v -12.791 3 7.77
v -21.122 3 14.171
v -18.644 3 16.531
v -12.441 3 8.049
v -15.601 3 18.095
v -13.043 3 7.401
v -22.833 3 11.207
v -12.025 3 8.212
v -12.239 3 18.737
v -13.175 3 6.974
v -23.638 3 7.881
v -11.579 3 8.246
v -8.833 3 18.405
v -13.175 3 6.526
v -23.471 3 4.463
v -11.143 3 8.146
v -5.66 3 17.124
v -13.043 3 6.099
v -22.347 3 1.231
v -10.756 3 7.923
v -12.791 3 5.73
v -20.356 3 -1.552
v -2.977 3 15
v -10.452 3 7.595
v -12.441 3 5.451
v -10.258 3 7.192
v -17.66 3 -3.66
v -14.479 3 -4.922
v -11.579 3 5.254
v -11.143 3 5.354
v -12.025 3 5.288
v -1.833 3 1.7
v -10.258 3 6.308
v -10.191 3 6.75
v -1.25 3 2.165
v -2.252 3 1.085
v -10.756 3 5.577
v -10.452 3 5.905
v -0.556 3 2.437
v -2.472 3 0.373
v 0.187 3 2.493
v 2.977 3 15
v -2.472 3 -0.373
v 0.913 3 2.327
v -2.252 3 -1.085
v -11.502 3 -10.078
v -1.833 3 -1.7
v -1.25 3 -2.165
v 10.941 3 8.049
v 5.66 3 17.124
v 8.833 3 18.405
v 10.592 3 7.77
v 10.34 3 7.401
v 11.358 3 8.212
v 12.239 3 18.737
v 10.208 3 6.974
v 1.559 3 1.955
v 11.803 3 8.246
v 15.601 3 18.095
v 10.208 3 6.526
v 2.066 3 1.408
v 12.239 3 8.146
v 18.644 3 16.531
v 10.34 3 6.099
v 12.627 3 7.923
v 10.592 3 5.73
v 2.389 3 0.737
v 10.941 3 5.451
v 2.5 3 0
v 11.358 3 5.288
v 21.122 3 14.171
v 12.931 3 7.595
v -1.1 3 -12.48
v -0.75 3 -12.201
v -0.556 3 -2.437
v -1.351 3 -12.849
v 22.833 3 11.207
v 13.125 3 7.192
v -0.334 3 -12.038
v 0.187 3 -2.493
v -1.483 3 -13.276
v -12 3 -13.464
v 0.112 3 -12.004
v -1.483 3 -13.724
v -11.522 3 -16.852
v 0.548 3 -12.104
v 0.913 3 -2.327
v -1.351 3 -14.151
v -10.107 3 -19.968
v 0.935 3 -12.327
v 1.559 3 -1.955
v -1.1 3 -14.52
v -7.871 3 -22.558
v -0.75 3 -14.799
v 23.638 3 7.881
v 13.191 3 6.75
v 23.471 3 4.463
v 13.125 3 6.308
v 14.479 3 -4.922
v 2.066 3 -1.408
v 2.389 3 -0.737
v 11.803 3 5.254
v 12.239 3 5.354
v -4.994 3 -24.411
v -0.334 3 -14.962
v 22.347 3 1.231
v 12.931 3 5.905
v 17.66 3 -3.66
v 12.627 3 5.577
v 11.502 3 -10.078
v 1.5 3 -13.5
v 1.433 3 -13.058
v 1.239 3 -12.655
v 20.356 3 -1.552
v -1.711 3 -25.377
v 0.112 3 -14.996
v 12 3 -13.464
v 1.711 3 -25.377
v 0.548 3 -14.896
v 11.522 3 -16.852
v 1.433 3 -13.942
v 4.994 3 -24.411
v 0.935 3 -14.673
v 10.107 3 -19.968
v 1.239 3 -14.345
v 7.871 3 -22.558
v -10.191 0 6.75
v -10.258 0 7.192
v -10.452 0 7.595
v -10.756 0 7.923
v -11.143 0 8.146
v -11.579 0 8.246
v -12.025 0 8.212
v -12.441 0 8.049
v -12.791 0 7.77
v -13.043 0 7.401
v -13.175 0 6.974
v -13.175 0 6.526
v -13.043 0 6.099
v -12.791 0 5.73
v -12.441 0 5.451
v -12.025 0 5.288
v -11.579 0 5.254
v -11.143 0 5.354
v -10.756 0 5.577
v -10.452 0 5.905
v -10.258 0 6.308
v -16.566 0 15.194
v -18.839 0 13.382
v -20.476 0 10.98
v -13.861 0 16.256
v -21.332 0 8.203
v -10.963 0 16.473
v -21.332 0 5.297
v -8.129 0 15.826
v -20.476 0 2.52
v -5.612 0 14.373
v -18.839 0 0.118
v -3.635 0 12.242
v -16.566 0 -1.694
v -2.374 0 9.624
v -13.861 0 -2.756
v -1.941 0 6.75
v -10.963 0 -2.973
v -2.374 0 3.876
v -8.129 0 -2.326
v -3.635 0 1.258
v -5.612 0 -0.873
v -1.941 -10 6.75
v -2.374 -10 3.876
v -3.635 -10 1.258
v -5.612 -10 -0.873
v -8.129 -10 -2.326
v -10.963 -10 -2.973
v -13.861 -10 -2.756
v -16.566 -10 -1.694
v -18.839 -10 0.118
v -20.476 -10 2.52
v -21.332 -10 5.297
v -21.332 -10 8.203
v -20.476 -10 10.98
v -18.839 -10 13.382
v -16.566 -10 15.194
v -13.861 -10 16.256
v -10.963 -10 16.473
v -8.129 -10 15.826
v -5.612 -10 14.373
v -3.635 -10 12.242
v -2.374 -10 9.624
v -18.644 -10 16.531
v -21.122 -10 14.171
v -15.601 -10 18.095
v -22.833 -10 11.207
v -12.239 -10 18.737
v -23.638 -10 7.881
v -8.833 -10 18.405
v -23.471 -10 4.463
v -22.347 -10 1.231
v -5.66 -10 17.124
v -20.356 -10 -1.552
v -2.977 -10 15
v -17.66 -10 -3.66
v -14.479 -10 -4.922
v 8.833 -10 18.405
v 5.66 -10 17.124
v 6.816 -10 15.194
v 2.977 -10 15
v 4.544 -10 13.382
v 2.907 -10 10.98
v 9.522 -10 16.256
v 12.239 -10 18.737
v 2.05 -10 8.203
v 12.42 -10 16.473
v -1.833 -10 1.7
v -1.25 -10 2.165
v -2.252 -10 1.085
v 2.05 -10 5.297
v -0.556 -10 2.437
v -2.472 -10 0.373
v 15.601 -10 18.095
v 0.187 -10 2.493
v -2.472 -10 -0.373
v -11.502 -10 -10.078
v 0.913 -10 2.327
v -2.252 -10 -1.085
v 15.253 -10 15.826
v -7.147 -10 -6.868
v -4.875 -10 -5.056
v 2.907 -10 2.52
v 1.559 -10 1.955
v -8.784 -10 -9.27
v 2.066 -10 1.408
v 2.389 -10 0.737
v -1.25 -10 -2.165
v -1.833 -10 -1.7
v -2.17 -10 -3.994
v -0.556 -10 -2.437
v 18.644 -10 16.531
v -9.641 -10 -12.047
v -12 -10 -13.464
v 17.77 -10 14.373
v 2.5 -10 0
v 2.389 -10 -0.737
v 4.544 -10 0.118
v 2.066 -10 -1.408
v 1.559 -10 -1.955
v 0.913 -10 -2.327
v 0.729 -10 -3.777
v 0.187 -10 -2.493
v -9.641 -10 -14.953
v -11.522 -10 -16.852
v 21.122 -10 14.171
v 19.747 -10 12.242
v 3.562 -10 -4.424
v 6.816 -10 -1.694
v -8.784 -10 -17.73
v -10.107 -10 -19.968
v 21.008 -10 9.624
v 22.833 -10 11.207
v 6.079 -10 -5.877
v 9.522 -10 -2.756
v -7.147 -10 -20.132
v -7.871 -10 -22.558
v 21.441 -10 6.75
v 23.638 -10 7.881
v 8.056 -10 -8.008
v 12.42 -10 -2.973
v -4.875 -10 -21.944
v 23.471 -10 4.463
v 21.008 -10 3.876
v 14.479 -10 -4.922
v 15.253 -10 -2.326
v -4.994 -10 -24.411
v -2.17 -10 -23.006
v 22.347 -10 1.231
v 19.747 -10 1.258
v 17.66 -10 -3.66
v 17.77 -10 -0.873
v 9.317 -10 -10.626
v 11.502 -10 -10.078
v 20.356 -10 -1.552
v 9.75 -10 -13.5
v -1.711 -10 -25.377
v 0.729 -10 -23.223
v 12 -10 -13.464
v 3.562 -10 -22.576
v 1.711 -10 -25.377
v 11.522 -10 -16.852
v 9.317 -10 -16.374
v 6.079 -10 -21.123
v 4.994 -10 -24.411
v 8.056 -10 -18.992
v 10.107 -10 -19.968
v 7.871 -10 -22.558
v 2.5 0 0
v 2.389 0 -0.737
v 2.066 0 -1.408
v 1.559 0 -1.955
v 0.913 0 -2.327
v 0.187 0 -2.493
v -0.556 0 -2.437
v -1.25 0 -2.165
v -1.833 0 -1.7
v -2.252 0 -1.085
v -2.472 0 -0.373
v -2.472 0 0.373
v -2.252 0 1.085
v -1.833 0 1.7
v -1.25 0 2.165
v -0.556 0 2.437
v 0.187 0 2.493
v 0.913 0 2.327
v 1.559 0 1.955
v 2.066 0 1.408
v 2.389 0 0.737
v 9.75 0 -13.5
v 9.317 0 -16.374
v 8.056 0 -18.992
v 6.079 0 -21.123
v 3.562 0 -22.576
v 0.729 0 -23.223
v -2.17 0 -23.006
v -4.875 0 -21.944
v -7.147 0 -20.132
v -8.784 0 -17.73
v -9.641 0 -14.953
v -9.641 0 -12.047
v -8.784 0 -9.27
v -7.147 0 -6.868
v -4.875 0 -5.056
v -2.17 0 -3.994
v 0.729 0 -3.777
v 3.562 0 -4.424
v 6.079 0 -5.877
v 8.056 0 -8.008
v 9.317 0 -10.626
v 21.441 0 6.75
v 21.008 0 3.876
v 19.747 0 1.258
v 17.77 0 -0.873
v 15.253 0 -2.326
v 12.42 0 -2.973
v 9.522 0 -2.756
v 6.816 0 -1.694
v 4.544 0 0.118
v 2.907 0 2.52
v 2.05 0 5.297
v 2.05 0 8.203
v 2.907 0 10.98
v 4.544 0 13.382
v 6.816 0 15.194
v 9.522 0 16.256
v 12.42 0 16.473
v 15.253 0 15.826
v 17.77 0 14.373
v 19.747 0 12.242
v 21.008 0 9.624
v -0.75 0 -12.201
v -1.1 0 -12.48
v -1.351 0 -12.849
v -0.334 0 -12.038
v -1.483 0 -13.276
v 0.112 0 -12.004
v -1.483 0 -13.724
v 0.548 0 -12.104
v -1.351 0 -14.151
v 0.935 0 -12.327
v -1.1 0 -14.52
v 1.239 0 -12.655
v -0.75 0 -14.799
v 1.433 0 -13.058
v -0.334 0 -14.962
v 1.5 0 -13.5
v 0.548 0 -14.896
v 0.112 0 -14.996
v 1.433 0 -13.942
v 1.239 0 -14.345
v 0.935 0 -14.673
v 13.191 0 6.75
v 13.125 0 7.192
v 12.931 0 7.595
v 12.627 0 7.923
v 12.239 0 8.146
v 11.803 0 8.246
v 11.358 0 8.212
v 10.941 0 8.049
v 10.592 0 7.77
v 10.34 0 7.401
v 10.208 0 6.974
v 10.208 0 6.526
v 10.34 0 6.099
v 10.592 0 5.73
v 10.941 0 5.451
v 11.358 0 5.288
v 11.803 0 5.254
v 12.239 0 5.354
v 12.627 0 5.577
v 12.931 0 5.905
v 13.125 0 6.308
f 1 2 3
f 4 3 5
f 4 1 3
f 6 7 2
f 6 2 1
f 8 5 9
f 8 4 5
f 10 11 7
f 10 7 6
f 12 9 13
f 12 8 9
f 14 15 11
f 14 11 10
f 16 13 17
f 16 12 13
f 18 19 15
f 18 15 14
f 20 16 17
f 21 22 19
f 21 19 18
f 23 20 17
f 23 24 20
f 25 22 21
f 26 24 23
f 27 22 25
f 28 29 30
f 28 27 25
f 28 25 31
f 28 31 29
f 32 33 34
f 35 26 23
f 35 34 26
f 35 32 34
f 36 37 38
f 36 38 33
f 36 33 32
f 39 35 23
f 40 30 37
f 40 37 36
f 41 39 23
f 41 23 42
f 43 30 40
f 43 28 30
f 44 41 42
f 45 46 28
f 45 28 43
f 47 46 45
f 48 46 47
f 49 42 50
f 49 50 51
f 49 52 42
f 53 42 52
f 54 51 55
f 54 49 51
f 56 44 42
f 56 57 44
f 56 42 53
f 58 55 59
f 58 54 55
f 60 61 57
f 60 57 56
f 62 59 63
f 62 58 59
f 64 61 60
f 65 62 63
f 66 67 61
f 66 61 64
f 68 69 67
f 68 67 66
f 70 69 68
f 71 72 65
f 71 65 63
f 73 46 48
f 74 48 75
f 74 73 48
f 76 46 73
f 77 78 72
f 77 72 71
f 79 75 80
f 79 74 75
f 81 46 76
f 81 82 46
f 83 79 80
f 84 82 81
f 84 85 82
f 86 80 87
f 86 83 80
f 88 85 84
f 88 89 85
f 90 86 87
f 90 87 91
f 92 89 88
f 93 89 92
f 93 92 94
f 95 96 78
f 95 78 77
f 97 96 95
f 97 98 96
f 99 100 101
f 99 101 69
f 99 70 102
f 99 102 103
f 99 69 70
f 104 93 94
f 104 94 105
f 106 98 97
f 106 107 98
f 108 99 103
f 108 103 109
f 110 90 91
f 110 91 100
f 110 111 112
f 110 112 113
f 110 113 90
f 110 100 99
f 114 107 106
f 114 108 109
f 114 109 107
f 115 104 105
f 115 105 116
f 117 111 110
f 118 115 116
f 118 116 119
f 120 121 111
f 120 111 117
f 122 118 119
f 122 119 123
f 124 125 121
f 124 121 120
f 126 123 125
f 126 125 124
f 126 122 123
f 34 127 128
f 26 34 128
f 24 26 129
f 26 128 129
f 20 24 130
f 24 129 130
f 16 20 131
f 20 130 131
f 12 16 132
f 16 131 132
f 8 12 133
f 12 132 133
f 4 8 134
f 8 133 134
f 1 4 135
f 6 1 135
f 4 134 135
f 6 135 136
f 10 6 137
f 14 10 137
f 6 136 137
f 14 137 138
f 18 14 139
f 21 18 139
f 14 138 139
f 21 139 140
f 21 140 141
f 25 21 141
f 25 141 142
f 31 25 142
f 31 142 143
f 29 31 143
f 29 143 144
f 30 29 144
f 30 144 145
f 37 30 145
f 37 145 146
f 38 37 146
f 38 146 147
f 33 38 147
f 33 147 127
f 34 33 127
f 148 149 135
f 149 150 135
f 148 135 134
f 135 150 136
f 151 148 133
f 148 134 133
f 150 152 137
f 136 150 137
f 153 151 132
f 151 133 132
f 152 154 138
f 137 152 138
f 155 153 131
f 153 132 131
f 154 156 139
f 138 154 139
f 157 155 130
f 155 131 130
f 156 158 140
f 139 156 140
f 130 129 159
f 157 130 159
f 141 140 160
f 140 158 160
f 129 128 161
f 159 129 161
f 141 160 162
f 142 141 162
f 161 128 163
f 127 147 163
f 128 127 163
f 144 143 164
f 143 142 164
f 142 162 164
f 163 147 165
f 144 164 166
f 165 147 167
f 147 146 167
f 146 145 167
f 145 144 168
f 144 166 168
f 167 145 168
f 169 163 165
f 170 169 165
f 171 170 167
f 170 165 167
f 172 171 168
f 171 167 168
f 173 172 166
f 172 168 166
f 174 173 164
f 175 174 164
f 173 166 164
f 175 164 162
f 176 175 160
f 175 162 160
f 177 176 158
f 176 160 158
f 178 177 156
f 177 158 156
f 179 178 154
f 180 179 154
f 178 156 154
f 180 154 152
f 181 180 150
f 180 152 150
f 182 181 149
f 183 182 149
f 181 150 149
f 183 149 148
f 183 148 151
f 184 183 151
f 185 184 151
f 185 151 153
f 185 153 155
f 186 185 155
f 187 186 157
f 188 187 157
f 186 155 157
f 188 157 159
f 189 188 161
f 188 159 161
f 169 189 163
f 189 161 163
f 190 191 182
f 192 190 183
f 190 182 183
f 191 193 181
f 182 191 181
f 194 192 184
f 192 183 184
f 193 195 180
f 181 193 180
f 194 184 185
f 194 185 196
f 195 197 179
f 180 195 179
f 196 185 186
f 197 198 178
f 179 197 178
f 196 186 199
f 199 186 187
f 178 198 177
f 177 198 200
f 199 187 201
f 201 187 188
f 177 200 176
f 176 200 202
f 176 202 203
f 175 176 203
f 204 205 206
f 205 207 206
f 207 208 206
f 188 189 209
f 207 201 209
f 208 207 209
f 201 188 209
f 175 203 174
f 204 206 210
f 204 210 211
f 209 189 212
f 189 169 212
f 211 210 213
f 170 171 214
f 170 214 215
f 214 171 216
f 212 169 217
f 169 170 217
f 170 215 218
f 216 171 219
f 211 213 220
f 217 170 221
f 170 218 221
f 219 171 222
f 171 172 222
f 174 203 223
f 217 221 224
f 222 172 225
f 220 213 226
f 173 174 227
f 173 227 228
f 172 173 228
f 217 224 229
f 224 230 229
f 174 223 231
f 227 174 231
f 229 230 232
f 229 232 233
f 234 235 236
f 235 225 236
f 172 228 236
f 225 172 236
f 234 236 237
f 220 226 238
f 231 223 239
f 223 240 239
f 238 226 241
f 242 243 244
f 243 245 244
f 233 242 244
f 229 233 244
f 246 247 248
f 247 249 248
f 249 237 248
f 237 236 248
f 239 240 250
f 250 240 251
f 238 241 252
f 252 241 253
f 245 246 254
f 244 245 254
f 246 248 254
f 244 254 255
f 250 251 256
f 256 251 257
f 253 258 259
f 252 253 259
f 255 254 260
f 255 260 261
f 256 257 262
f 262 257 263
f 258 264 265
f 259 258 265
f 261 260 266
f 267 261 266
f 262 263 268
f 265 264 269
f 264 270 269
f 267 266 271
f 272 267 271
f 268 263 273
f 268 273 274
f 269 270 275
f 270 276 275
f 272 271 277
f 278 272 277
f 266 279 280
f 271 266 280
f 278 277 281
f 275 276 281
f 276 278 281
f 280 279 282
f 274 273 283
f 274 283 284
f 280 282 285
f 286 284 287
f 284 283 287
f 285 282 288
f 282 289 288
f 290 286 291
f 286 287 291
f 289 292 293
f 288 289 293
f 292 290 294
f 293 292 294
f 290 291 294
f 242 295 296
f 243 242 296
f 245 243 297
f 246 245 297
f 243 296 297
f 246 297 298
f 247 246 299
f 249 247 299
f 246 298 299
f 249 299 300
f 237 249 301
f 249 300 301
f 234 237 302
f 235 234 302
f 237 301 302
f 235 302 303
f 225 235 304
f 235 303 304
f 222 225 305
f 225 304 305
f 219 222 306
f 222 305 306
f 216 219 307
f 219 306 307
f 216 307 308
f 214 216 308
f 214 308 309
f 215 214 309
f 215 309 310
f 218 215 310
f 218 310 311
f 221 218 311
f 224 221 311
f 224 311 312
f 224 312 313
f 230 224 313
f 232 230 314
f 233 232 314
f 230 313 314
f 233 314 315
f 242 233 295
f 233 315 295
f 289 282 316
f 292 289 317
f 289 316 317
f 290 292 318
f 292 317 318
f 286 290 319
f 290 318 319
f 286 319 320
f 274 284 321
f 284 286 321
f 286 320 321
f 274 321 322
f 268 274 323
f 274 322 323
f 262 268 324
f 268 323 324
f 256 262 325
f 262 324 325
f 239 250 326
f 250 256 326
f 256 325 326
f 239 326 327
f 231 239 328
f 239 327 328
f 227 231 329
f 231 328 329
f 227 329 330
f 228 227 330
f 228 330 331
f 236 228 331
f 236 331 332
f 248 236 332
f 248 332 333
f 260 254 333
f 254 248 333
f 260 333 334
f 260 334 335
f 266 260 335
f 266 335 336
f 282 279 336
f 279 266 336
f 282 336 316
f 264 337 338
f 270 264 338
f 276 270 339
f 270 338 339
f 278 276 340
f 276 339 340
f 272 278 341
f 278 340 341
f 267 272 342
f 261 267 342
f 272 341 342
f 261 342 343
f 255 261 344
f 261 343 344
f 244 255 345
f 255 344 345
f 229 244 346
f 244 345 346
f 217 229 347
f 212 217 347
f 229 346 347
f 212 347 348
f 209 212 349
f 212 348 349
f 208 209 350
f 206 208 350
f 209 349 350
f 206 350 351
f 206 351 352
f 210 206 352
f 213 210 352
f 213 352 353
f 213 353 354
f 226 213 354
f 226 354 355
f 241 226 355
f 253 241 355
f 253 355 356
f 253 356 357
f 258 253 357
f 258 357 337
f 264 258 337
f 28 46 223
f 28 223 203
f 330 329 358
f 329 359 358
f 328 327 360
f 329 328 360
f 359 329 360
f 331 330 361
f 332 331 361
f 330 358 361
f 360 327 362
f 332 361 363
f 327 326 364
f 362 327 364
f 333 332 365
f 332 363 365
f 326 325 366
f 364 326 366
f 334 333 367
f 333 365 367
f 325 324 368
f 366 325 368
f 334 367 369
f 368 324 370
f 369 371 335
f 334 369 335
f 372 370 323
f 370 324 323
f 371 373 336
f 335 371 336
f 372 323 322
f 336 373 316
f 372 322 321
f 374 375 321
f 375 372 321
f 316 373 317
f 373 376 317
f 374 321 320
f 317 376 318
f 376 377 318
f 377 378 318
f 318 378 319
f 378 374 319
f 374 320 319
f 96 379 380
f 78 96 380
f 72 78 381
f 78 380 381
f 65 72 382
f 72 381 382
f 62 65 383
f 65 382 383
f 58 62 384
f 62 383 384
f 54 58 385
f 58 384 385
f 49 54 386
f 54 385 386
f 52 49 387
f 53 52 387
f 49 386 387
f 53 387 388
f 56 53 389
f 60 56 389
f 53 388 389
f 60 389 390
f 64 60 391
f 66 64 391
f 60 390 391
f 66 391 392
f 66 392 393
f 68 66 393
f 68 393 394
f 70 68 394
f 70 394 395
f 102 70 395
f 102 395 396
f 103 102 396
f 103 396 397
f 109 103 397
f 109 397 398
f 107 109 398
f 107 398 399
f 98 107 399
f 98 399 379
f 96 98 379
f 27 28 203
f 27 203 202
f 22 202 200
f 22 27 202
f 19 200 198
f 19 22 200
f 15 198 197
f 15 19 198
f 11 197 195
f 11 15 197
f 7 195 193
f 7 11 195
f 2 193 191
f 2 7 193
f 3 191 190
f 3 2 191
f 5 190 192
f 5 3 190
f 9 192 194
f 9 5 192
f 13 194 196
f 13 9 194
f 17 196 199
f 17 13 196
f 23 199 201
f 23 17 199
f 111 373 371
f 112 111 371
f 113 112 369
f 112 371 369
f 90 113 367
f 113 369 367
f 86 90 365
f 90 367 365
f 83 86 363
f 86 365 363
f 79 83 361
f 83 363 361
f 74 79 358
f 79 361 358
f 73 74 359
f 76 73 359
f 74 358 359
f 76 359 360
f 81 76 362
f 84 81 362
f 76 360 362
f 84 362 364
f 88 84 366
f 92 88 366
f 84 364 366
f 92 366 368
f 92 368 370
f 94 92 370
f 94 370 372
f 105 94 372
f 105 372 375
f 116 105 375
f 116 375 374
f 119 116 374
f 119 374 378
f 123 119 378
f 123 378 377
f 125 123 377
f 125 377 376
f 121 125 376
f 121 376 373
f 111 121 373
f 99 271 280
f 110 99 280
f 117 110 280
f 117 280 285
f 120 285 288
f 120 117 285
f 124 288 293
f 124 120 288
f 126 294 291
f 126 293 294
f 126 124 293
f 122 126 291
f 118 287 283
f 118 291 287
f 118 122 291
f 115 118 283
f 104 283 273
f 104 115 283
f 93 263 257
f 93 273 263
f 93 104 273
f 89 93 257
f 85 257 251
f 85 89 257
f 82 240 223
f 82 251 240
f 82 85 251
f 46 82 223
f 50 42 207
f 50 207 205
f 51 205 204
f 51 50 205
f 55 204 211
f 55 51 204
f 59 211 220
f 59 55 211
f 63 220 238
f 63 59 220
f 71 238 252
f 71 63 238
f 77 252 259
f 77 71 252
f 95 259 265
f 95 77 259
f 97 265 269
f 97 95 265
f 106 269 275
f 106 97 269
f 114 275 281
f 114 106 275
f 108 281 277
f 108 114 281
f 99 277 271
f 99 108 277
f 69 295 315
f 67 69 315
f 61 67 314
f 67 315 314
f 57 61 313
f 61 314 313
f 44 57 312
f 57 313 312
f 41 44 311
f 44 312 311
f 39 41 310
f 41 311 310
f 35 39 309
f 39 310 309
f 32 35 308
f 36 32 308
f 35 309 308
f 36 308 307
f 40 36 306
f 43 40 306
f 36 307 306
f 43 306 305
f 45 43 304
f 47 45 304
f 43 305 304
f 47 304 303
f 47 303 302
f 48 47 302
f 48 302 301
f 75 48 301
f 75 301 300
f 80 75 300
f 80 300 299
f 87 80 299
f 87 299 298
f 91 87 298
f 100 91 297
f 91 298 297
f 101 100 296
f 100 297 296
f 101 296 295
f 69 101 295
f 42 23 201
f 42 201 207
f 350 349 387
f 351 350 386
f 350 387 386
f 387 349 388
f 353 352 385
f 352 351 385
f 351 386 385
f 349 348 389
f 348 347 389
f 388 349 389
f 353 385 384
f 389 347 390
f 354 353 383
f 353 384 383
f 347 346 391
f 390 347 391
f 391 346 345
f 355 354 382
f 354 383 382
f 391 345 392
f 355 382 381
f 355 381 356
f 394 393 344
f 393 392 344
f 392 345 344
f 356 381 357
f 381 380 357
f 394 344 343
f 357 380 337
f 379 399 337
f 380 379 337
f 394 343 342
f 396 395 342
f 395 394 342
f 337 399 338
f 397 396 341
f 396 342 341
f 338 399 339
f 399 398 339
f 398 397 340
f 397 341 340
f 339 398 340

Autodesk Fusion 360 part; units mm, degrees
sketch "Sketch1" plane through (0, 0, 0) normal (0, 1, 0) x (1, 0, 0)
  circle A0 centre (0, 13.5) radius 9.75
  circle A1 centre (-11.6913, -6.75) radius 9.75
  circle A2 centre (11.6913, -6.75) radius 9.75
  line L0 (25.9808, -15) -> (0, 30)
  line L1 (0, 30) -> (-25.9808, -15)
  line L2 (-25.9808, -15) -> (25.9808, -15)
  circle A3 centre (0, 13.5) radius 12
  circle A4 centre (-11.6913, -6.75) radius 12
  circle A5 centre (11.6913, -6.75) radius 12
  circle A6 centre (0, 0) radius 2.5
  circle A7 centre (-11.6913, -6.75) radius 1.5
  circle A8 centre (11.6913, -6.75) radius 1.5
  circle A9 centre (0, 13.5) radius 1.5
  dimension "d1" = 19.5
  dimension "d2" = 13.5
  dimension "d4" = 360
  dimension "d5" = 30
  dimension "d6" = 24
  dimension "d8" = 360
  dimension "d9" = 5
  dimension "d14" = 3
  dimension "d16" = 360
extrude "Extrude1" add sketch "Sketch1" along normal blind 3 contours A0 L0 | A0 L0 A3 | A0 L0 L1 | A0 L0 L1 A3 | A0 L0 L1 A3 A4 A5 A6 | A0 L1 | A0 L1 A3 | L0 A3 A5 | L1 A3 A4 | A2 L0 A5 | A2 L0 L2 A3 A4 A5 A6 | A3 A5 | A1 L1 L2 A3 A4 A5 A6 | A1 L1 A4 | A3 A4 | A2 L0 L2 | A2 L0 | A3 A5 A6 | A1 L1 | A1 L1 L2 | A1 L1 L2 A4 | A3 A4 A6 | A2 L2 | A2 L2 A5 | A2 L0 L2 A5 | A1 L2 A4 | L2 A4 A5 | A4 A5 A6 | A1 L2 | A4 A5 | A7 | A8 | A9
extrude "Extrude2" add sketch "Sketch1" against normal blind 10 contours A0 L0 A3 | A0 L0 L1 A3 | A0 L0 L1 A3 A4 A5 A6 | A0 L1 A3 | L0 A3 A5 | L1 A3 A4 | A2 L0 A5 | A2 L0 L2 A3 A4 A5 A6 | A3 A5 | A1 L1 L2 A3 A4 A5 A6 | A1 L1 A4 | A3 A4 | A3 A5 A6 | A1 L1 L2 A4 | A3 A4 A6 | A2 L2 A5 | A2 L0 L2 A5 | A1 L2 A4 | L2 A4 A5 | A4 A5 A6 | A4 A5
extrude "Extrude3" cut sketch "Sketch1" along normal through all contours A7 | A8 | A9
